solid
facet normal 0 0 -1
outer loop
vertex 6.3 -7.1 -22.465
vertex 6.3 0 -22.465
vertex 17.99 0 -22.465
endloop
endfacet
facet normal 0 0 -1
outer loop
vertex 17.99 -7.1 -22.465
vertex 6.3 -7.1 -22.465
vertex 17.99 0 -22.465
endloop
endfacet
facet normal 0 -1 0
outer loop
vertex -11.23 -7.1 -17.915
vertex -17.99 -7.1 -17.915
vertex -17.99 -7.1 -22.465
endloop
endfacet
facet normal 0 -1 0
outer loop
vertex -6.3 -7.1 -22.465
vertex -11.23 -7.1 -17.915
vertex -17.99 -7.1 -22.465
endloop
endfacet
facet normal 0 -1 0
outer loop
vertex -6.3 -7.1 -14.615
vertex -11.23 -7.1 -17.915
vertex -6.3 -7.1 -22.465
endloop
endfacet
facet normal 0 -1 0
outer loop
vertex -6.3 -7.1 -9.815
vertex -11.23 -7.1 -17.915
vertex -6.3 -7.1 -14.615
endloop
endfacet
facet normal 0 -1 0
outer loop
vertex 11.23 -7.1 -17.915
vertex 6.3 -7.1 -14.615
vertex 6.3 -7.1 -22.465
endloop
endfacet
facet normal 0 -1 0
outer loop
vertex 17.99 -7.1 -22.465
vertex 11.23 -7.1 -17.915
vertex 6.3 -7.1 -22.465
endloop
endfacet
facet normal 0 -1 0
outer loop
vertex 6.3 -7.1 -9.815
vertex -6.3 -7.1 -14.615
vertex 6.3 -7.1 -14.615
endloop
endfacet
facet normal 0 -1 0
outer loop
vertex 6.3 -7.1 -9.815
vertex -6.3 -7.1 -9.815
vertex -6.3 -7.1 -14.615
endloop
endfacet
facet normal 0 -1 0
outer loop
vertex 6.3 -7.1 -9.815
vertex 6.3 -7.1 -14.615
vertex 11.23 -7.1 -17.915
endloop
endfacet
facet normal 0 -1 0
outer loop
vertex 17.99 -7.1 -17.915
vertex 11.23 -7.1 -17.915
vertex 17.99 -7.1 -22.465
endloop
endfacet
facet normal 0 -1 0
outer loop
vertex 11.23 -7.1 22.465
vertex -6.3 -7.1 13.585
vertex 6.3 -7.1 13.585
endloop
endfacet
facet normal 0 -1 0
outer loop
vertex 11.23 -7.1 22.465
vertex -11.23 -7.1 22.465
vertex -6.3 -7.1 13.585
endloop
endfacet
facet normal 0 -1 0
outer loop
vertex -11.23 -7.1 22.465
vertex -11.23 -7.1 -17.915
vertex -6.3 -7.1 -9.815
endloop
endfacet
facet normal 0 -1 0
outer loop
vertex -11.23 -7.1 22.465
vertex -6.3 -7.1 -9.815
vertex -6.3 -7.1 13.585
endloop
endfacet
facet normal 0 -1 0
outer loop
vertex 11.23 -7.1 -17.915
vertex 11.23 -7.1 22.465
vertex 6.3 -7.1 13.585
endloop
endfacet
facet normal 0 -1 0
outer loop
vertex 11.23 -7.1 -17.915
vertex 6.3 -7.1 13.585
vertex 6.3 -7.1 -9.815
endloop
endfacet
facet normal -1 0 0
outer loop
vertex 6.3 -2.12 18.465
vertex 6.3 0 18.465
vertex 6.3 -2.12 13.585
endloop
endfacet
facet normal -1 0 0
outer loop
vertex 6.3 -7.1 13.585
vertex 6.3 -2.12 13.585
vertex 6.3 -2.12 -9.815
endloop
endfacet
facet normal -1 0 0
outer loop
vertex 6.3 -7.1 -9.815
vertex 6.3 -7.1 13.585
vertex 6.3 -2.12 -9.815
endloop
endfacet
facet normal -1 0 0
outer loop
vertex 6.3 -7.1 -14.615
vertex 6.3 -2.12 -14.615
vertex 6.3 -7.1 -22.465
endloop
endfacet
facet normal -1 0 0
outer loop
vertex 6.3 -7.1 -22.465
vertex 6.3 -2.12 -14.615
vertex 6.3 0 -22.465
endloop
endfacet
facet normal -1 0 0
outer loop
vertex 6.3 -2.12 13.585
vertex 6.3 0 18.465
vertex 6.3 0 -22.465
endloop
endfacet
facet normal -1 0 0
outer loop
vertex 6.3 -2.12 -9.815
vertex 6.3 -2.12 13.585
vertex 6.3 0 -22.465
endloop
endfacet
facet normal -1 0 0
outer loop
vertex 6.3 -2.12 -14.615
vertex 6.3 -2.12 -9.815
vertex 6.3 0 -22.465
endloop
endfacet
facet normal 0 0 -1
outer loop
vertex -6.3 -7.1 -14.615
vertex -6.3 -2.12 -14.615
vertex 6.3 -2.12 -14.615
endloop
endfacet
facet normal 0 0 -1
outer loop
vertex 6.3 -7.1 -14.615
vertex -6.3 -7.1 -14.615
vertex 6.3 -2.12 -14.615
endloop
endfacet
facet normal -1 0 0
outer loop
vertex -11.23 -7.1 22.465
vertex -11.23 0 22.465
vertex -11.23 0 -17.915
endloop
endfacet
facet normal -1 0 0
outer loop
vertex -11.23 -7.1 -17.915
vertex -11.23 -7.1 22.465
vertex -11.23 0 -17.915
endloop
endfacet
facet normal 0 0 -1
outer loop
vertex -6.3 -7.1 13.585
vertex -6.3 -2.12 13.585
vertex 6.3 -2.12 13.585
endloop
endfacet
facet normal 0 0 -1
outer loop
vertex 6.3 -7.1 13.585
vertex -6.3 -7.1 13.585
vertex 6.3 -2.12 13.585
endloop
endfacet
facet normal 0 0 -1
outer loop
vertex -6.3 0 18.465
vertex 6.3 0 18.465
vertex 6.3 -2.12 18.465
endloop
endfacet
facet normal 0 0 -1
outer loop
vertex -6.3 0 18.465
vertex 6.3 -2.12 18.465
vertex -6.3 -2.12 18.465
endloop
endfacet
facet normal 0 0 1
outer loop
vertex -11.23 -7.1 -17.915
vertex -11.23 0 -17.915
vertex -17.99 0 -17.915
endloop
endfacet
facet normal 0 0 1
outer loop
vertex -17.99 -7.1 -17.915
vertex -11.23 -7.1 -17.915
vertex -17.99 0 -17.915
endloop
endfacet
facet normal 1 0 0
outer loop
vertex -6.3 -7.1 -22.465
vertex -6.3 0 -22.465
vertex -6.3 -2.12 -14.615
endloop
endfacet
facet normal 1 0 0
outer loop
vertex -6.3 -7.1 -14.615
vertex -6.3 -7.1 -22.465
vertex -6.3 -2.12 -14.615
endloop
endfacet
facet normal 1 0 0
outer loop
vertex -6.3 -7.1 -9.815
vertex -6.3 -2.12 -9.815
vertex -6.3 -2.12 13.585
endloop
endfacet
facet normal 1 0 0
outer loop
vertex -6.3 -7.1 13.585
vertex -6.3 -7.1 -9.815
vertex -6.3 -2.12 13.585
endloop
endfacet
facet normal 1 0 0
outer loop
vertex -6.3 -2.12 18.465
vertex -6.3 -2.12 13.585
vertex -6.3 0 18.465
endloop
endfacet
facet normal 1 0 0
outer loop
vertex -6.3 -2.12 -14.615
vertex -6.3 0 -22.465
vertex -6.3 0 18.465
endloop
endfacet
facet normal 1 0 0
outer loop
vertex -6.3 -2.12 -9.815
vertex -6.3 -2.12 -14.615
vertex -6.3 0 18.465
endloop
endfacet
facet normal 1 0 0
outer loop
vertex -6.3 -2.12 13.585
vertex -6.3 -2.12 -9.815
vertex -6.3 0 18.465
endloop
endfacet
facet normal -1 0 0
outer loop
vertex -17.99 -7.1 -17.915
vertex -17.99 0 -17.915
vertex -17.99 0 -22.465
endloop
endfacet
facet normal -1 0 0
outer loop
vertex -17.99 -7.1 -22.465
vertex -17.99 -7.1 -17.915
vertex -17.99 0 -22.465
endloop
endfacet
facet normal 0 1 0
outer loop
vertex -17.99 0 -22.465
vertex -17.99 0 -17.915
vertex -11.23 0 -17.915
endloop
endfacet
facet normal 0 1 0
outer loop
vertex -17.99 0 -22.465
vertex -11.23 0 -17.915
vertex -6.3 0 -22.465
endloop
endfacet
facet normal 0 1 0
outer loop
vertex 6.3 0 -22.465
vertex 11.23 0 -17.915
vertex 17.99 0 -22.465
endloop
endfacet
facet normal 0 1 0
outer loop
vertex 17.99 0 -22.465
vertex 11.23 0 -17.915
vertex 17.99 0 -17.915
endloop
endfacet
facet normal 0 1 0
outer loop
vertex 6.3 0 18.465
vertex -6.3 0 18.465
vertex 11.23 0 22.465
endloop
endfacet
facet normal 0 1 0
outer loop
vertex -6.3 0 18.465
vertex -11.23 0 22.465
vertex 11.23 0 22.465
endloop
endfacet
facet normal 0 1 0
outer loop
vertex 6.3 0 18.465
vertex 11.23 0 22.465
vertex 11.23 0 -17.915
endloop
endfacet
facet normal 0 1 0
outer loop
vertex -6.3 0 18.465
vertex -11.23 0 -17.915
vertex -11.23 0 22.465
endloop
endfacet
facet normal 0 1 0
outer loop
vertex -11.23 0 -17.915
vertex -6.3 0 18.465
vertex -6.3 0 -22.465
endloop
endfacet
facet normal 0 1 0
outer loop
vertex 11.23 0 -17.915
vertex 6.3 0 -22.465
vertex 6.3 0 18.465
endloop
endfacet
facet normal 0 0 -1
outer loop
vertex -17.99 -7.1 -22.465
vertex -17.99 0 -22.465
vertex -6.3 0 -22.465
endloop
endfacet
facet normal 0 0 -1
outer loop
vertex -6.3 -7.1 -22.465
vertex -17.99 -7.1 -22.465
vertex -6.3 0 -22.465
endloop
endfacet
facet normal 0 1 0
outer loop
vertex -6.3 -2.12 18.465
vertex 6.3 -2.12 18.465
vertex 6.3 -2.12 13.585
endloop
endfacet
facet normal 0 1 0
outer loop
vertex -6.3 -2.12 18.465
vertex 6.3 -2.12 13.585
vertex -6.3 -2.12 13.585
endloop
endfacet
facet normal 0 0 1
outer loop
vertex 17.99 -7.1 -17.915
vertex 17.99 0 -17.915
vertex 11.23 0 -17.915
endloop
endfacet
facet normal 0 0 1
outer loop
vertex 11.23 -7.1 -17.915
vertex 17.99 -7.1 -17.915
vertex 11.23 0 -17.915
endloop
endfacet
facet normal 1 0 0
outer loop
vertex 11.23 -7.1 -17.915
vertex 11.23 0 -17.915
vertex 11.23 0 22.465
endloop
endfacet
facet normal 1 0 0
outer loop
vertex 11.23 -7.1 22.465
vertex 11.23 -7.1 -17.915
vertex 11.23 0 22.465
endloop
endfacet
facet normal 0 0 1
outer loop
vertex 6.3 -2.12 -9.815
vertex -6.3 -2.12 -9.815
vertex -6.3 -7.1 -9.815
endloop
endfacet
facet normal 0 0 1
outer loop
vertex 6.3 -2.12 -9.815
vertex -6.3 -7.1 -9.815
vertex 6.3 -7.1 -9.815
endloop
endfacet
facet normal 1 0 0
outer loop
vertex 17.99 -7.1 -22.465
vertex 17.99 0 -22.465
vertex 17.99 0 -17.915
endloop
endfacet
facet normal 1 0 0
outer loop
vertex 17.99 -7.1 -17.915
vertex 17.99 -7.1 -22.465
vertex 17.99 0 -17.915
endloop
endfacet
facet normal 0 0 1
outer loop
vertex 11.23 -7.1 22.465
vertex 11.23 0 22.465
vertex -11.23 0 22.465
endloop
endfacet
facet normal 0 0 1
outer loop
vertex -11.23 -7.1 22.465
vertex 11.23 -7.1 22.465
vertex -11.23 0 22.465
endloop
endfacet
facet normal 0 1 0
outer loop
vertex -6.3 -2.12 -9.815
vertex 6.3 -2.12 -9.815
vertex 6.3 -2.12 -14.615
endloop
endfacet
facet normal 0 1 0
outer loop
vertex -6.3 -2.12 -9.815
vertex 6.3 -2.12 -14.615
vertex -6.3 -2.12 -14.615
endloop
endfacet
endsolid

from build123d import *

# Parameters (mm, degrees)
F0_W     = 12.6
F0_H     = 23.4
F1_DEPTH = 7.1
F2_W     = 12.6
F2_H     = 4.8
F2_H_2   = 4.88
F3_DEPTH = 2.12


with BuildPart() as f1:
    # F0 (on Front) → F1 (new body)
    with BuildSketch(Plane.XZ):
        Polygon((11.23, 22.465), (-11.23, 22.465), (-11.23, -17.915), (-17.99, -17.915), (-17.99, -22.465), (-6.3, -22.465), (-6.3, -14.615), (6.3, -14.615), (6.3, -22.465), (17.99, -22.465), (17.99, -17.915), (11.23, -17.915), align=None)
        with Locations((0, 1.885)):
            Rectangle(F0_W, F0_H, mode=Mode.SUBTRACT)
    extrude(amount=F1_DEPTH)

    # F2 (on face) → F3 (cut)
    with BuildSketch(Plane(origin=(0, 0, 0), x_dir=(-1, 0, 0), z_dir=(0, 1, 0))):
        with Locations((0, -12.215)):
            Rectangle(F2_W, F2_H)
        with Locations((0, 16.025)):
            Rectangle(F2_W, F2_H_2)
    extrude(amount=-F3_DEPTH, mode=Mode.SUBTRACT)


solid = f1.part
